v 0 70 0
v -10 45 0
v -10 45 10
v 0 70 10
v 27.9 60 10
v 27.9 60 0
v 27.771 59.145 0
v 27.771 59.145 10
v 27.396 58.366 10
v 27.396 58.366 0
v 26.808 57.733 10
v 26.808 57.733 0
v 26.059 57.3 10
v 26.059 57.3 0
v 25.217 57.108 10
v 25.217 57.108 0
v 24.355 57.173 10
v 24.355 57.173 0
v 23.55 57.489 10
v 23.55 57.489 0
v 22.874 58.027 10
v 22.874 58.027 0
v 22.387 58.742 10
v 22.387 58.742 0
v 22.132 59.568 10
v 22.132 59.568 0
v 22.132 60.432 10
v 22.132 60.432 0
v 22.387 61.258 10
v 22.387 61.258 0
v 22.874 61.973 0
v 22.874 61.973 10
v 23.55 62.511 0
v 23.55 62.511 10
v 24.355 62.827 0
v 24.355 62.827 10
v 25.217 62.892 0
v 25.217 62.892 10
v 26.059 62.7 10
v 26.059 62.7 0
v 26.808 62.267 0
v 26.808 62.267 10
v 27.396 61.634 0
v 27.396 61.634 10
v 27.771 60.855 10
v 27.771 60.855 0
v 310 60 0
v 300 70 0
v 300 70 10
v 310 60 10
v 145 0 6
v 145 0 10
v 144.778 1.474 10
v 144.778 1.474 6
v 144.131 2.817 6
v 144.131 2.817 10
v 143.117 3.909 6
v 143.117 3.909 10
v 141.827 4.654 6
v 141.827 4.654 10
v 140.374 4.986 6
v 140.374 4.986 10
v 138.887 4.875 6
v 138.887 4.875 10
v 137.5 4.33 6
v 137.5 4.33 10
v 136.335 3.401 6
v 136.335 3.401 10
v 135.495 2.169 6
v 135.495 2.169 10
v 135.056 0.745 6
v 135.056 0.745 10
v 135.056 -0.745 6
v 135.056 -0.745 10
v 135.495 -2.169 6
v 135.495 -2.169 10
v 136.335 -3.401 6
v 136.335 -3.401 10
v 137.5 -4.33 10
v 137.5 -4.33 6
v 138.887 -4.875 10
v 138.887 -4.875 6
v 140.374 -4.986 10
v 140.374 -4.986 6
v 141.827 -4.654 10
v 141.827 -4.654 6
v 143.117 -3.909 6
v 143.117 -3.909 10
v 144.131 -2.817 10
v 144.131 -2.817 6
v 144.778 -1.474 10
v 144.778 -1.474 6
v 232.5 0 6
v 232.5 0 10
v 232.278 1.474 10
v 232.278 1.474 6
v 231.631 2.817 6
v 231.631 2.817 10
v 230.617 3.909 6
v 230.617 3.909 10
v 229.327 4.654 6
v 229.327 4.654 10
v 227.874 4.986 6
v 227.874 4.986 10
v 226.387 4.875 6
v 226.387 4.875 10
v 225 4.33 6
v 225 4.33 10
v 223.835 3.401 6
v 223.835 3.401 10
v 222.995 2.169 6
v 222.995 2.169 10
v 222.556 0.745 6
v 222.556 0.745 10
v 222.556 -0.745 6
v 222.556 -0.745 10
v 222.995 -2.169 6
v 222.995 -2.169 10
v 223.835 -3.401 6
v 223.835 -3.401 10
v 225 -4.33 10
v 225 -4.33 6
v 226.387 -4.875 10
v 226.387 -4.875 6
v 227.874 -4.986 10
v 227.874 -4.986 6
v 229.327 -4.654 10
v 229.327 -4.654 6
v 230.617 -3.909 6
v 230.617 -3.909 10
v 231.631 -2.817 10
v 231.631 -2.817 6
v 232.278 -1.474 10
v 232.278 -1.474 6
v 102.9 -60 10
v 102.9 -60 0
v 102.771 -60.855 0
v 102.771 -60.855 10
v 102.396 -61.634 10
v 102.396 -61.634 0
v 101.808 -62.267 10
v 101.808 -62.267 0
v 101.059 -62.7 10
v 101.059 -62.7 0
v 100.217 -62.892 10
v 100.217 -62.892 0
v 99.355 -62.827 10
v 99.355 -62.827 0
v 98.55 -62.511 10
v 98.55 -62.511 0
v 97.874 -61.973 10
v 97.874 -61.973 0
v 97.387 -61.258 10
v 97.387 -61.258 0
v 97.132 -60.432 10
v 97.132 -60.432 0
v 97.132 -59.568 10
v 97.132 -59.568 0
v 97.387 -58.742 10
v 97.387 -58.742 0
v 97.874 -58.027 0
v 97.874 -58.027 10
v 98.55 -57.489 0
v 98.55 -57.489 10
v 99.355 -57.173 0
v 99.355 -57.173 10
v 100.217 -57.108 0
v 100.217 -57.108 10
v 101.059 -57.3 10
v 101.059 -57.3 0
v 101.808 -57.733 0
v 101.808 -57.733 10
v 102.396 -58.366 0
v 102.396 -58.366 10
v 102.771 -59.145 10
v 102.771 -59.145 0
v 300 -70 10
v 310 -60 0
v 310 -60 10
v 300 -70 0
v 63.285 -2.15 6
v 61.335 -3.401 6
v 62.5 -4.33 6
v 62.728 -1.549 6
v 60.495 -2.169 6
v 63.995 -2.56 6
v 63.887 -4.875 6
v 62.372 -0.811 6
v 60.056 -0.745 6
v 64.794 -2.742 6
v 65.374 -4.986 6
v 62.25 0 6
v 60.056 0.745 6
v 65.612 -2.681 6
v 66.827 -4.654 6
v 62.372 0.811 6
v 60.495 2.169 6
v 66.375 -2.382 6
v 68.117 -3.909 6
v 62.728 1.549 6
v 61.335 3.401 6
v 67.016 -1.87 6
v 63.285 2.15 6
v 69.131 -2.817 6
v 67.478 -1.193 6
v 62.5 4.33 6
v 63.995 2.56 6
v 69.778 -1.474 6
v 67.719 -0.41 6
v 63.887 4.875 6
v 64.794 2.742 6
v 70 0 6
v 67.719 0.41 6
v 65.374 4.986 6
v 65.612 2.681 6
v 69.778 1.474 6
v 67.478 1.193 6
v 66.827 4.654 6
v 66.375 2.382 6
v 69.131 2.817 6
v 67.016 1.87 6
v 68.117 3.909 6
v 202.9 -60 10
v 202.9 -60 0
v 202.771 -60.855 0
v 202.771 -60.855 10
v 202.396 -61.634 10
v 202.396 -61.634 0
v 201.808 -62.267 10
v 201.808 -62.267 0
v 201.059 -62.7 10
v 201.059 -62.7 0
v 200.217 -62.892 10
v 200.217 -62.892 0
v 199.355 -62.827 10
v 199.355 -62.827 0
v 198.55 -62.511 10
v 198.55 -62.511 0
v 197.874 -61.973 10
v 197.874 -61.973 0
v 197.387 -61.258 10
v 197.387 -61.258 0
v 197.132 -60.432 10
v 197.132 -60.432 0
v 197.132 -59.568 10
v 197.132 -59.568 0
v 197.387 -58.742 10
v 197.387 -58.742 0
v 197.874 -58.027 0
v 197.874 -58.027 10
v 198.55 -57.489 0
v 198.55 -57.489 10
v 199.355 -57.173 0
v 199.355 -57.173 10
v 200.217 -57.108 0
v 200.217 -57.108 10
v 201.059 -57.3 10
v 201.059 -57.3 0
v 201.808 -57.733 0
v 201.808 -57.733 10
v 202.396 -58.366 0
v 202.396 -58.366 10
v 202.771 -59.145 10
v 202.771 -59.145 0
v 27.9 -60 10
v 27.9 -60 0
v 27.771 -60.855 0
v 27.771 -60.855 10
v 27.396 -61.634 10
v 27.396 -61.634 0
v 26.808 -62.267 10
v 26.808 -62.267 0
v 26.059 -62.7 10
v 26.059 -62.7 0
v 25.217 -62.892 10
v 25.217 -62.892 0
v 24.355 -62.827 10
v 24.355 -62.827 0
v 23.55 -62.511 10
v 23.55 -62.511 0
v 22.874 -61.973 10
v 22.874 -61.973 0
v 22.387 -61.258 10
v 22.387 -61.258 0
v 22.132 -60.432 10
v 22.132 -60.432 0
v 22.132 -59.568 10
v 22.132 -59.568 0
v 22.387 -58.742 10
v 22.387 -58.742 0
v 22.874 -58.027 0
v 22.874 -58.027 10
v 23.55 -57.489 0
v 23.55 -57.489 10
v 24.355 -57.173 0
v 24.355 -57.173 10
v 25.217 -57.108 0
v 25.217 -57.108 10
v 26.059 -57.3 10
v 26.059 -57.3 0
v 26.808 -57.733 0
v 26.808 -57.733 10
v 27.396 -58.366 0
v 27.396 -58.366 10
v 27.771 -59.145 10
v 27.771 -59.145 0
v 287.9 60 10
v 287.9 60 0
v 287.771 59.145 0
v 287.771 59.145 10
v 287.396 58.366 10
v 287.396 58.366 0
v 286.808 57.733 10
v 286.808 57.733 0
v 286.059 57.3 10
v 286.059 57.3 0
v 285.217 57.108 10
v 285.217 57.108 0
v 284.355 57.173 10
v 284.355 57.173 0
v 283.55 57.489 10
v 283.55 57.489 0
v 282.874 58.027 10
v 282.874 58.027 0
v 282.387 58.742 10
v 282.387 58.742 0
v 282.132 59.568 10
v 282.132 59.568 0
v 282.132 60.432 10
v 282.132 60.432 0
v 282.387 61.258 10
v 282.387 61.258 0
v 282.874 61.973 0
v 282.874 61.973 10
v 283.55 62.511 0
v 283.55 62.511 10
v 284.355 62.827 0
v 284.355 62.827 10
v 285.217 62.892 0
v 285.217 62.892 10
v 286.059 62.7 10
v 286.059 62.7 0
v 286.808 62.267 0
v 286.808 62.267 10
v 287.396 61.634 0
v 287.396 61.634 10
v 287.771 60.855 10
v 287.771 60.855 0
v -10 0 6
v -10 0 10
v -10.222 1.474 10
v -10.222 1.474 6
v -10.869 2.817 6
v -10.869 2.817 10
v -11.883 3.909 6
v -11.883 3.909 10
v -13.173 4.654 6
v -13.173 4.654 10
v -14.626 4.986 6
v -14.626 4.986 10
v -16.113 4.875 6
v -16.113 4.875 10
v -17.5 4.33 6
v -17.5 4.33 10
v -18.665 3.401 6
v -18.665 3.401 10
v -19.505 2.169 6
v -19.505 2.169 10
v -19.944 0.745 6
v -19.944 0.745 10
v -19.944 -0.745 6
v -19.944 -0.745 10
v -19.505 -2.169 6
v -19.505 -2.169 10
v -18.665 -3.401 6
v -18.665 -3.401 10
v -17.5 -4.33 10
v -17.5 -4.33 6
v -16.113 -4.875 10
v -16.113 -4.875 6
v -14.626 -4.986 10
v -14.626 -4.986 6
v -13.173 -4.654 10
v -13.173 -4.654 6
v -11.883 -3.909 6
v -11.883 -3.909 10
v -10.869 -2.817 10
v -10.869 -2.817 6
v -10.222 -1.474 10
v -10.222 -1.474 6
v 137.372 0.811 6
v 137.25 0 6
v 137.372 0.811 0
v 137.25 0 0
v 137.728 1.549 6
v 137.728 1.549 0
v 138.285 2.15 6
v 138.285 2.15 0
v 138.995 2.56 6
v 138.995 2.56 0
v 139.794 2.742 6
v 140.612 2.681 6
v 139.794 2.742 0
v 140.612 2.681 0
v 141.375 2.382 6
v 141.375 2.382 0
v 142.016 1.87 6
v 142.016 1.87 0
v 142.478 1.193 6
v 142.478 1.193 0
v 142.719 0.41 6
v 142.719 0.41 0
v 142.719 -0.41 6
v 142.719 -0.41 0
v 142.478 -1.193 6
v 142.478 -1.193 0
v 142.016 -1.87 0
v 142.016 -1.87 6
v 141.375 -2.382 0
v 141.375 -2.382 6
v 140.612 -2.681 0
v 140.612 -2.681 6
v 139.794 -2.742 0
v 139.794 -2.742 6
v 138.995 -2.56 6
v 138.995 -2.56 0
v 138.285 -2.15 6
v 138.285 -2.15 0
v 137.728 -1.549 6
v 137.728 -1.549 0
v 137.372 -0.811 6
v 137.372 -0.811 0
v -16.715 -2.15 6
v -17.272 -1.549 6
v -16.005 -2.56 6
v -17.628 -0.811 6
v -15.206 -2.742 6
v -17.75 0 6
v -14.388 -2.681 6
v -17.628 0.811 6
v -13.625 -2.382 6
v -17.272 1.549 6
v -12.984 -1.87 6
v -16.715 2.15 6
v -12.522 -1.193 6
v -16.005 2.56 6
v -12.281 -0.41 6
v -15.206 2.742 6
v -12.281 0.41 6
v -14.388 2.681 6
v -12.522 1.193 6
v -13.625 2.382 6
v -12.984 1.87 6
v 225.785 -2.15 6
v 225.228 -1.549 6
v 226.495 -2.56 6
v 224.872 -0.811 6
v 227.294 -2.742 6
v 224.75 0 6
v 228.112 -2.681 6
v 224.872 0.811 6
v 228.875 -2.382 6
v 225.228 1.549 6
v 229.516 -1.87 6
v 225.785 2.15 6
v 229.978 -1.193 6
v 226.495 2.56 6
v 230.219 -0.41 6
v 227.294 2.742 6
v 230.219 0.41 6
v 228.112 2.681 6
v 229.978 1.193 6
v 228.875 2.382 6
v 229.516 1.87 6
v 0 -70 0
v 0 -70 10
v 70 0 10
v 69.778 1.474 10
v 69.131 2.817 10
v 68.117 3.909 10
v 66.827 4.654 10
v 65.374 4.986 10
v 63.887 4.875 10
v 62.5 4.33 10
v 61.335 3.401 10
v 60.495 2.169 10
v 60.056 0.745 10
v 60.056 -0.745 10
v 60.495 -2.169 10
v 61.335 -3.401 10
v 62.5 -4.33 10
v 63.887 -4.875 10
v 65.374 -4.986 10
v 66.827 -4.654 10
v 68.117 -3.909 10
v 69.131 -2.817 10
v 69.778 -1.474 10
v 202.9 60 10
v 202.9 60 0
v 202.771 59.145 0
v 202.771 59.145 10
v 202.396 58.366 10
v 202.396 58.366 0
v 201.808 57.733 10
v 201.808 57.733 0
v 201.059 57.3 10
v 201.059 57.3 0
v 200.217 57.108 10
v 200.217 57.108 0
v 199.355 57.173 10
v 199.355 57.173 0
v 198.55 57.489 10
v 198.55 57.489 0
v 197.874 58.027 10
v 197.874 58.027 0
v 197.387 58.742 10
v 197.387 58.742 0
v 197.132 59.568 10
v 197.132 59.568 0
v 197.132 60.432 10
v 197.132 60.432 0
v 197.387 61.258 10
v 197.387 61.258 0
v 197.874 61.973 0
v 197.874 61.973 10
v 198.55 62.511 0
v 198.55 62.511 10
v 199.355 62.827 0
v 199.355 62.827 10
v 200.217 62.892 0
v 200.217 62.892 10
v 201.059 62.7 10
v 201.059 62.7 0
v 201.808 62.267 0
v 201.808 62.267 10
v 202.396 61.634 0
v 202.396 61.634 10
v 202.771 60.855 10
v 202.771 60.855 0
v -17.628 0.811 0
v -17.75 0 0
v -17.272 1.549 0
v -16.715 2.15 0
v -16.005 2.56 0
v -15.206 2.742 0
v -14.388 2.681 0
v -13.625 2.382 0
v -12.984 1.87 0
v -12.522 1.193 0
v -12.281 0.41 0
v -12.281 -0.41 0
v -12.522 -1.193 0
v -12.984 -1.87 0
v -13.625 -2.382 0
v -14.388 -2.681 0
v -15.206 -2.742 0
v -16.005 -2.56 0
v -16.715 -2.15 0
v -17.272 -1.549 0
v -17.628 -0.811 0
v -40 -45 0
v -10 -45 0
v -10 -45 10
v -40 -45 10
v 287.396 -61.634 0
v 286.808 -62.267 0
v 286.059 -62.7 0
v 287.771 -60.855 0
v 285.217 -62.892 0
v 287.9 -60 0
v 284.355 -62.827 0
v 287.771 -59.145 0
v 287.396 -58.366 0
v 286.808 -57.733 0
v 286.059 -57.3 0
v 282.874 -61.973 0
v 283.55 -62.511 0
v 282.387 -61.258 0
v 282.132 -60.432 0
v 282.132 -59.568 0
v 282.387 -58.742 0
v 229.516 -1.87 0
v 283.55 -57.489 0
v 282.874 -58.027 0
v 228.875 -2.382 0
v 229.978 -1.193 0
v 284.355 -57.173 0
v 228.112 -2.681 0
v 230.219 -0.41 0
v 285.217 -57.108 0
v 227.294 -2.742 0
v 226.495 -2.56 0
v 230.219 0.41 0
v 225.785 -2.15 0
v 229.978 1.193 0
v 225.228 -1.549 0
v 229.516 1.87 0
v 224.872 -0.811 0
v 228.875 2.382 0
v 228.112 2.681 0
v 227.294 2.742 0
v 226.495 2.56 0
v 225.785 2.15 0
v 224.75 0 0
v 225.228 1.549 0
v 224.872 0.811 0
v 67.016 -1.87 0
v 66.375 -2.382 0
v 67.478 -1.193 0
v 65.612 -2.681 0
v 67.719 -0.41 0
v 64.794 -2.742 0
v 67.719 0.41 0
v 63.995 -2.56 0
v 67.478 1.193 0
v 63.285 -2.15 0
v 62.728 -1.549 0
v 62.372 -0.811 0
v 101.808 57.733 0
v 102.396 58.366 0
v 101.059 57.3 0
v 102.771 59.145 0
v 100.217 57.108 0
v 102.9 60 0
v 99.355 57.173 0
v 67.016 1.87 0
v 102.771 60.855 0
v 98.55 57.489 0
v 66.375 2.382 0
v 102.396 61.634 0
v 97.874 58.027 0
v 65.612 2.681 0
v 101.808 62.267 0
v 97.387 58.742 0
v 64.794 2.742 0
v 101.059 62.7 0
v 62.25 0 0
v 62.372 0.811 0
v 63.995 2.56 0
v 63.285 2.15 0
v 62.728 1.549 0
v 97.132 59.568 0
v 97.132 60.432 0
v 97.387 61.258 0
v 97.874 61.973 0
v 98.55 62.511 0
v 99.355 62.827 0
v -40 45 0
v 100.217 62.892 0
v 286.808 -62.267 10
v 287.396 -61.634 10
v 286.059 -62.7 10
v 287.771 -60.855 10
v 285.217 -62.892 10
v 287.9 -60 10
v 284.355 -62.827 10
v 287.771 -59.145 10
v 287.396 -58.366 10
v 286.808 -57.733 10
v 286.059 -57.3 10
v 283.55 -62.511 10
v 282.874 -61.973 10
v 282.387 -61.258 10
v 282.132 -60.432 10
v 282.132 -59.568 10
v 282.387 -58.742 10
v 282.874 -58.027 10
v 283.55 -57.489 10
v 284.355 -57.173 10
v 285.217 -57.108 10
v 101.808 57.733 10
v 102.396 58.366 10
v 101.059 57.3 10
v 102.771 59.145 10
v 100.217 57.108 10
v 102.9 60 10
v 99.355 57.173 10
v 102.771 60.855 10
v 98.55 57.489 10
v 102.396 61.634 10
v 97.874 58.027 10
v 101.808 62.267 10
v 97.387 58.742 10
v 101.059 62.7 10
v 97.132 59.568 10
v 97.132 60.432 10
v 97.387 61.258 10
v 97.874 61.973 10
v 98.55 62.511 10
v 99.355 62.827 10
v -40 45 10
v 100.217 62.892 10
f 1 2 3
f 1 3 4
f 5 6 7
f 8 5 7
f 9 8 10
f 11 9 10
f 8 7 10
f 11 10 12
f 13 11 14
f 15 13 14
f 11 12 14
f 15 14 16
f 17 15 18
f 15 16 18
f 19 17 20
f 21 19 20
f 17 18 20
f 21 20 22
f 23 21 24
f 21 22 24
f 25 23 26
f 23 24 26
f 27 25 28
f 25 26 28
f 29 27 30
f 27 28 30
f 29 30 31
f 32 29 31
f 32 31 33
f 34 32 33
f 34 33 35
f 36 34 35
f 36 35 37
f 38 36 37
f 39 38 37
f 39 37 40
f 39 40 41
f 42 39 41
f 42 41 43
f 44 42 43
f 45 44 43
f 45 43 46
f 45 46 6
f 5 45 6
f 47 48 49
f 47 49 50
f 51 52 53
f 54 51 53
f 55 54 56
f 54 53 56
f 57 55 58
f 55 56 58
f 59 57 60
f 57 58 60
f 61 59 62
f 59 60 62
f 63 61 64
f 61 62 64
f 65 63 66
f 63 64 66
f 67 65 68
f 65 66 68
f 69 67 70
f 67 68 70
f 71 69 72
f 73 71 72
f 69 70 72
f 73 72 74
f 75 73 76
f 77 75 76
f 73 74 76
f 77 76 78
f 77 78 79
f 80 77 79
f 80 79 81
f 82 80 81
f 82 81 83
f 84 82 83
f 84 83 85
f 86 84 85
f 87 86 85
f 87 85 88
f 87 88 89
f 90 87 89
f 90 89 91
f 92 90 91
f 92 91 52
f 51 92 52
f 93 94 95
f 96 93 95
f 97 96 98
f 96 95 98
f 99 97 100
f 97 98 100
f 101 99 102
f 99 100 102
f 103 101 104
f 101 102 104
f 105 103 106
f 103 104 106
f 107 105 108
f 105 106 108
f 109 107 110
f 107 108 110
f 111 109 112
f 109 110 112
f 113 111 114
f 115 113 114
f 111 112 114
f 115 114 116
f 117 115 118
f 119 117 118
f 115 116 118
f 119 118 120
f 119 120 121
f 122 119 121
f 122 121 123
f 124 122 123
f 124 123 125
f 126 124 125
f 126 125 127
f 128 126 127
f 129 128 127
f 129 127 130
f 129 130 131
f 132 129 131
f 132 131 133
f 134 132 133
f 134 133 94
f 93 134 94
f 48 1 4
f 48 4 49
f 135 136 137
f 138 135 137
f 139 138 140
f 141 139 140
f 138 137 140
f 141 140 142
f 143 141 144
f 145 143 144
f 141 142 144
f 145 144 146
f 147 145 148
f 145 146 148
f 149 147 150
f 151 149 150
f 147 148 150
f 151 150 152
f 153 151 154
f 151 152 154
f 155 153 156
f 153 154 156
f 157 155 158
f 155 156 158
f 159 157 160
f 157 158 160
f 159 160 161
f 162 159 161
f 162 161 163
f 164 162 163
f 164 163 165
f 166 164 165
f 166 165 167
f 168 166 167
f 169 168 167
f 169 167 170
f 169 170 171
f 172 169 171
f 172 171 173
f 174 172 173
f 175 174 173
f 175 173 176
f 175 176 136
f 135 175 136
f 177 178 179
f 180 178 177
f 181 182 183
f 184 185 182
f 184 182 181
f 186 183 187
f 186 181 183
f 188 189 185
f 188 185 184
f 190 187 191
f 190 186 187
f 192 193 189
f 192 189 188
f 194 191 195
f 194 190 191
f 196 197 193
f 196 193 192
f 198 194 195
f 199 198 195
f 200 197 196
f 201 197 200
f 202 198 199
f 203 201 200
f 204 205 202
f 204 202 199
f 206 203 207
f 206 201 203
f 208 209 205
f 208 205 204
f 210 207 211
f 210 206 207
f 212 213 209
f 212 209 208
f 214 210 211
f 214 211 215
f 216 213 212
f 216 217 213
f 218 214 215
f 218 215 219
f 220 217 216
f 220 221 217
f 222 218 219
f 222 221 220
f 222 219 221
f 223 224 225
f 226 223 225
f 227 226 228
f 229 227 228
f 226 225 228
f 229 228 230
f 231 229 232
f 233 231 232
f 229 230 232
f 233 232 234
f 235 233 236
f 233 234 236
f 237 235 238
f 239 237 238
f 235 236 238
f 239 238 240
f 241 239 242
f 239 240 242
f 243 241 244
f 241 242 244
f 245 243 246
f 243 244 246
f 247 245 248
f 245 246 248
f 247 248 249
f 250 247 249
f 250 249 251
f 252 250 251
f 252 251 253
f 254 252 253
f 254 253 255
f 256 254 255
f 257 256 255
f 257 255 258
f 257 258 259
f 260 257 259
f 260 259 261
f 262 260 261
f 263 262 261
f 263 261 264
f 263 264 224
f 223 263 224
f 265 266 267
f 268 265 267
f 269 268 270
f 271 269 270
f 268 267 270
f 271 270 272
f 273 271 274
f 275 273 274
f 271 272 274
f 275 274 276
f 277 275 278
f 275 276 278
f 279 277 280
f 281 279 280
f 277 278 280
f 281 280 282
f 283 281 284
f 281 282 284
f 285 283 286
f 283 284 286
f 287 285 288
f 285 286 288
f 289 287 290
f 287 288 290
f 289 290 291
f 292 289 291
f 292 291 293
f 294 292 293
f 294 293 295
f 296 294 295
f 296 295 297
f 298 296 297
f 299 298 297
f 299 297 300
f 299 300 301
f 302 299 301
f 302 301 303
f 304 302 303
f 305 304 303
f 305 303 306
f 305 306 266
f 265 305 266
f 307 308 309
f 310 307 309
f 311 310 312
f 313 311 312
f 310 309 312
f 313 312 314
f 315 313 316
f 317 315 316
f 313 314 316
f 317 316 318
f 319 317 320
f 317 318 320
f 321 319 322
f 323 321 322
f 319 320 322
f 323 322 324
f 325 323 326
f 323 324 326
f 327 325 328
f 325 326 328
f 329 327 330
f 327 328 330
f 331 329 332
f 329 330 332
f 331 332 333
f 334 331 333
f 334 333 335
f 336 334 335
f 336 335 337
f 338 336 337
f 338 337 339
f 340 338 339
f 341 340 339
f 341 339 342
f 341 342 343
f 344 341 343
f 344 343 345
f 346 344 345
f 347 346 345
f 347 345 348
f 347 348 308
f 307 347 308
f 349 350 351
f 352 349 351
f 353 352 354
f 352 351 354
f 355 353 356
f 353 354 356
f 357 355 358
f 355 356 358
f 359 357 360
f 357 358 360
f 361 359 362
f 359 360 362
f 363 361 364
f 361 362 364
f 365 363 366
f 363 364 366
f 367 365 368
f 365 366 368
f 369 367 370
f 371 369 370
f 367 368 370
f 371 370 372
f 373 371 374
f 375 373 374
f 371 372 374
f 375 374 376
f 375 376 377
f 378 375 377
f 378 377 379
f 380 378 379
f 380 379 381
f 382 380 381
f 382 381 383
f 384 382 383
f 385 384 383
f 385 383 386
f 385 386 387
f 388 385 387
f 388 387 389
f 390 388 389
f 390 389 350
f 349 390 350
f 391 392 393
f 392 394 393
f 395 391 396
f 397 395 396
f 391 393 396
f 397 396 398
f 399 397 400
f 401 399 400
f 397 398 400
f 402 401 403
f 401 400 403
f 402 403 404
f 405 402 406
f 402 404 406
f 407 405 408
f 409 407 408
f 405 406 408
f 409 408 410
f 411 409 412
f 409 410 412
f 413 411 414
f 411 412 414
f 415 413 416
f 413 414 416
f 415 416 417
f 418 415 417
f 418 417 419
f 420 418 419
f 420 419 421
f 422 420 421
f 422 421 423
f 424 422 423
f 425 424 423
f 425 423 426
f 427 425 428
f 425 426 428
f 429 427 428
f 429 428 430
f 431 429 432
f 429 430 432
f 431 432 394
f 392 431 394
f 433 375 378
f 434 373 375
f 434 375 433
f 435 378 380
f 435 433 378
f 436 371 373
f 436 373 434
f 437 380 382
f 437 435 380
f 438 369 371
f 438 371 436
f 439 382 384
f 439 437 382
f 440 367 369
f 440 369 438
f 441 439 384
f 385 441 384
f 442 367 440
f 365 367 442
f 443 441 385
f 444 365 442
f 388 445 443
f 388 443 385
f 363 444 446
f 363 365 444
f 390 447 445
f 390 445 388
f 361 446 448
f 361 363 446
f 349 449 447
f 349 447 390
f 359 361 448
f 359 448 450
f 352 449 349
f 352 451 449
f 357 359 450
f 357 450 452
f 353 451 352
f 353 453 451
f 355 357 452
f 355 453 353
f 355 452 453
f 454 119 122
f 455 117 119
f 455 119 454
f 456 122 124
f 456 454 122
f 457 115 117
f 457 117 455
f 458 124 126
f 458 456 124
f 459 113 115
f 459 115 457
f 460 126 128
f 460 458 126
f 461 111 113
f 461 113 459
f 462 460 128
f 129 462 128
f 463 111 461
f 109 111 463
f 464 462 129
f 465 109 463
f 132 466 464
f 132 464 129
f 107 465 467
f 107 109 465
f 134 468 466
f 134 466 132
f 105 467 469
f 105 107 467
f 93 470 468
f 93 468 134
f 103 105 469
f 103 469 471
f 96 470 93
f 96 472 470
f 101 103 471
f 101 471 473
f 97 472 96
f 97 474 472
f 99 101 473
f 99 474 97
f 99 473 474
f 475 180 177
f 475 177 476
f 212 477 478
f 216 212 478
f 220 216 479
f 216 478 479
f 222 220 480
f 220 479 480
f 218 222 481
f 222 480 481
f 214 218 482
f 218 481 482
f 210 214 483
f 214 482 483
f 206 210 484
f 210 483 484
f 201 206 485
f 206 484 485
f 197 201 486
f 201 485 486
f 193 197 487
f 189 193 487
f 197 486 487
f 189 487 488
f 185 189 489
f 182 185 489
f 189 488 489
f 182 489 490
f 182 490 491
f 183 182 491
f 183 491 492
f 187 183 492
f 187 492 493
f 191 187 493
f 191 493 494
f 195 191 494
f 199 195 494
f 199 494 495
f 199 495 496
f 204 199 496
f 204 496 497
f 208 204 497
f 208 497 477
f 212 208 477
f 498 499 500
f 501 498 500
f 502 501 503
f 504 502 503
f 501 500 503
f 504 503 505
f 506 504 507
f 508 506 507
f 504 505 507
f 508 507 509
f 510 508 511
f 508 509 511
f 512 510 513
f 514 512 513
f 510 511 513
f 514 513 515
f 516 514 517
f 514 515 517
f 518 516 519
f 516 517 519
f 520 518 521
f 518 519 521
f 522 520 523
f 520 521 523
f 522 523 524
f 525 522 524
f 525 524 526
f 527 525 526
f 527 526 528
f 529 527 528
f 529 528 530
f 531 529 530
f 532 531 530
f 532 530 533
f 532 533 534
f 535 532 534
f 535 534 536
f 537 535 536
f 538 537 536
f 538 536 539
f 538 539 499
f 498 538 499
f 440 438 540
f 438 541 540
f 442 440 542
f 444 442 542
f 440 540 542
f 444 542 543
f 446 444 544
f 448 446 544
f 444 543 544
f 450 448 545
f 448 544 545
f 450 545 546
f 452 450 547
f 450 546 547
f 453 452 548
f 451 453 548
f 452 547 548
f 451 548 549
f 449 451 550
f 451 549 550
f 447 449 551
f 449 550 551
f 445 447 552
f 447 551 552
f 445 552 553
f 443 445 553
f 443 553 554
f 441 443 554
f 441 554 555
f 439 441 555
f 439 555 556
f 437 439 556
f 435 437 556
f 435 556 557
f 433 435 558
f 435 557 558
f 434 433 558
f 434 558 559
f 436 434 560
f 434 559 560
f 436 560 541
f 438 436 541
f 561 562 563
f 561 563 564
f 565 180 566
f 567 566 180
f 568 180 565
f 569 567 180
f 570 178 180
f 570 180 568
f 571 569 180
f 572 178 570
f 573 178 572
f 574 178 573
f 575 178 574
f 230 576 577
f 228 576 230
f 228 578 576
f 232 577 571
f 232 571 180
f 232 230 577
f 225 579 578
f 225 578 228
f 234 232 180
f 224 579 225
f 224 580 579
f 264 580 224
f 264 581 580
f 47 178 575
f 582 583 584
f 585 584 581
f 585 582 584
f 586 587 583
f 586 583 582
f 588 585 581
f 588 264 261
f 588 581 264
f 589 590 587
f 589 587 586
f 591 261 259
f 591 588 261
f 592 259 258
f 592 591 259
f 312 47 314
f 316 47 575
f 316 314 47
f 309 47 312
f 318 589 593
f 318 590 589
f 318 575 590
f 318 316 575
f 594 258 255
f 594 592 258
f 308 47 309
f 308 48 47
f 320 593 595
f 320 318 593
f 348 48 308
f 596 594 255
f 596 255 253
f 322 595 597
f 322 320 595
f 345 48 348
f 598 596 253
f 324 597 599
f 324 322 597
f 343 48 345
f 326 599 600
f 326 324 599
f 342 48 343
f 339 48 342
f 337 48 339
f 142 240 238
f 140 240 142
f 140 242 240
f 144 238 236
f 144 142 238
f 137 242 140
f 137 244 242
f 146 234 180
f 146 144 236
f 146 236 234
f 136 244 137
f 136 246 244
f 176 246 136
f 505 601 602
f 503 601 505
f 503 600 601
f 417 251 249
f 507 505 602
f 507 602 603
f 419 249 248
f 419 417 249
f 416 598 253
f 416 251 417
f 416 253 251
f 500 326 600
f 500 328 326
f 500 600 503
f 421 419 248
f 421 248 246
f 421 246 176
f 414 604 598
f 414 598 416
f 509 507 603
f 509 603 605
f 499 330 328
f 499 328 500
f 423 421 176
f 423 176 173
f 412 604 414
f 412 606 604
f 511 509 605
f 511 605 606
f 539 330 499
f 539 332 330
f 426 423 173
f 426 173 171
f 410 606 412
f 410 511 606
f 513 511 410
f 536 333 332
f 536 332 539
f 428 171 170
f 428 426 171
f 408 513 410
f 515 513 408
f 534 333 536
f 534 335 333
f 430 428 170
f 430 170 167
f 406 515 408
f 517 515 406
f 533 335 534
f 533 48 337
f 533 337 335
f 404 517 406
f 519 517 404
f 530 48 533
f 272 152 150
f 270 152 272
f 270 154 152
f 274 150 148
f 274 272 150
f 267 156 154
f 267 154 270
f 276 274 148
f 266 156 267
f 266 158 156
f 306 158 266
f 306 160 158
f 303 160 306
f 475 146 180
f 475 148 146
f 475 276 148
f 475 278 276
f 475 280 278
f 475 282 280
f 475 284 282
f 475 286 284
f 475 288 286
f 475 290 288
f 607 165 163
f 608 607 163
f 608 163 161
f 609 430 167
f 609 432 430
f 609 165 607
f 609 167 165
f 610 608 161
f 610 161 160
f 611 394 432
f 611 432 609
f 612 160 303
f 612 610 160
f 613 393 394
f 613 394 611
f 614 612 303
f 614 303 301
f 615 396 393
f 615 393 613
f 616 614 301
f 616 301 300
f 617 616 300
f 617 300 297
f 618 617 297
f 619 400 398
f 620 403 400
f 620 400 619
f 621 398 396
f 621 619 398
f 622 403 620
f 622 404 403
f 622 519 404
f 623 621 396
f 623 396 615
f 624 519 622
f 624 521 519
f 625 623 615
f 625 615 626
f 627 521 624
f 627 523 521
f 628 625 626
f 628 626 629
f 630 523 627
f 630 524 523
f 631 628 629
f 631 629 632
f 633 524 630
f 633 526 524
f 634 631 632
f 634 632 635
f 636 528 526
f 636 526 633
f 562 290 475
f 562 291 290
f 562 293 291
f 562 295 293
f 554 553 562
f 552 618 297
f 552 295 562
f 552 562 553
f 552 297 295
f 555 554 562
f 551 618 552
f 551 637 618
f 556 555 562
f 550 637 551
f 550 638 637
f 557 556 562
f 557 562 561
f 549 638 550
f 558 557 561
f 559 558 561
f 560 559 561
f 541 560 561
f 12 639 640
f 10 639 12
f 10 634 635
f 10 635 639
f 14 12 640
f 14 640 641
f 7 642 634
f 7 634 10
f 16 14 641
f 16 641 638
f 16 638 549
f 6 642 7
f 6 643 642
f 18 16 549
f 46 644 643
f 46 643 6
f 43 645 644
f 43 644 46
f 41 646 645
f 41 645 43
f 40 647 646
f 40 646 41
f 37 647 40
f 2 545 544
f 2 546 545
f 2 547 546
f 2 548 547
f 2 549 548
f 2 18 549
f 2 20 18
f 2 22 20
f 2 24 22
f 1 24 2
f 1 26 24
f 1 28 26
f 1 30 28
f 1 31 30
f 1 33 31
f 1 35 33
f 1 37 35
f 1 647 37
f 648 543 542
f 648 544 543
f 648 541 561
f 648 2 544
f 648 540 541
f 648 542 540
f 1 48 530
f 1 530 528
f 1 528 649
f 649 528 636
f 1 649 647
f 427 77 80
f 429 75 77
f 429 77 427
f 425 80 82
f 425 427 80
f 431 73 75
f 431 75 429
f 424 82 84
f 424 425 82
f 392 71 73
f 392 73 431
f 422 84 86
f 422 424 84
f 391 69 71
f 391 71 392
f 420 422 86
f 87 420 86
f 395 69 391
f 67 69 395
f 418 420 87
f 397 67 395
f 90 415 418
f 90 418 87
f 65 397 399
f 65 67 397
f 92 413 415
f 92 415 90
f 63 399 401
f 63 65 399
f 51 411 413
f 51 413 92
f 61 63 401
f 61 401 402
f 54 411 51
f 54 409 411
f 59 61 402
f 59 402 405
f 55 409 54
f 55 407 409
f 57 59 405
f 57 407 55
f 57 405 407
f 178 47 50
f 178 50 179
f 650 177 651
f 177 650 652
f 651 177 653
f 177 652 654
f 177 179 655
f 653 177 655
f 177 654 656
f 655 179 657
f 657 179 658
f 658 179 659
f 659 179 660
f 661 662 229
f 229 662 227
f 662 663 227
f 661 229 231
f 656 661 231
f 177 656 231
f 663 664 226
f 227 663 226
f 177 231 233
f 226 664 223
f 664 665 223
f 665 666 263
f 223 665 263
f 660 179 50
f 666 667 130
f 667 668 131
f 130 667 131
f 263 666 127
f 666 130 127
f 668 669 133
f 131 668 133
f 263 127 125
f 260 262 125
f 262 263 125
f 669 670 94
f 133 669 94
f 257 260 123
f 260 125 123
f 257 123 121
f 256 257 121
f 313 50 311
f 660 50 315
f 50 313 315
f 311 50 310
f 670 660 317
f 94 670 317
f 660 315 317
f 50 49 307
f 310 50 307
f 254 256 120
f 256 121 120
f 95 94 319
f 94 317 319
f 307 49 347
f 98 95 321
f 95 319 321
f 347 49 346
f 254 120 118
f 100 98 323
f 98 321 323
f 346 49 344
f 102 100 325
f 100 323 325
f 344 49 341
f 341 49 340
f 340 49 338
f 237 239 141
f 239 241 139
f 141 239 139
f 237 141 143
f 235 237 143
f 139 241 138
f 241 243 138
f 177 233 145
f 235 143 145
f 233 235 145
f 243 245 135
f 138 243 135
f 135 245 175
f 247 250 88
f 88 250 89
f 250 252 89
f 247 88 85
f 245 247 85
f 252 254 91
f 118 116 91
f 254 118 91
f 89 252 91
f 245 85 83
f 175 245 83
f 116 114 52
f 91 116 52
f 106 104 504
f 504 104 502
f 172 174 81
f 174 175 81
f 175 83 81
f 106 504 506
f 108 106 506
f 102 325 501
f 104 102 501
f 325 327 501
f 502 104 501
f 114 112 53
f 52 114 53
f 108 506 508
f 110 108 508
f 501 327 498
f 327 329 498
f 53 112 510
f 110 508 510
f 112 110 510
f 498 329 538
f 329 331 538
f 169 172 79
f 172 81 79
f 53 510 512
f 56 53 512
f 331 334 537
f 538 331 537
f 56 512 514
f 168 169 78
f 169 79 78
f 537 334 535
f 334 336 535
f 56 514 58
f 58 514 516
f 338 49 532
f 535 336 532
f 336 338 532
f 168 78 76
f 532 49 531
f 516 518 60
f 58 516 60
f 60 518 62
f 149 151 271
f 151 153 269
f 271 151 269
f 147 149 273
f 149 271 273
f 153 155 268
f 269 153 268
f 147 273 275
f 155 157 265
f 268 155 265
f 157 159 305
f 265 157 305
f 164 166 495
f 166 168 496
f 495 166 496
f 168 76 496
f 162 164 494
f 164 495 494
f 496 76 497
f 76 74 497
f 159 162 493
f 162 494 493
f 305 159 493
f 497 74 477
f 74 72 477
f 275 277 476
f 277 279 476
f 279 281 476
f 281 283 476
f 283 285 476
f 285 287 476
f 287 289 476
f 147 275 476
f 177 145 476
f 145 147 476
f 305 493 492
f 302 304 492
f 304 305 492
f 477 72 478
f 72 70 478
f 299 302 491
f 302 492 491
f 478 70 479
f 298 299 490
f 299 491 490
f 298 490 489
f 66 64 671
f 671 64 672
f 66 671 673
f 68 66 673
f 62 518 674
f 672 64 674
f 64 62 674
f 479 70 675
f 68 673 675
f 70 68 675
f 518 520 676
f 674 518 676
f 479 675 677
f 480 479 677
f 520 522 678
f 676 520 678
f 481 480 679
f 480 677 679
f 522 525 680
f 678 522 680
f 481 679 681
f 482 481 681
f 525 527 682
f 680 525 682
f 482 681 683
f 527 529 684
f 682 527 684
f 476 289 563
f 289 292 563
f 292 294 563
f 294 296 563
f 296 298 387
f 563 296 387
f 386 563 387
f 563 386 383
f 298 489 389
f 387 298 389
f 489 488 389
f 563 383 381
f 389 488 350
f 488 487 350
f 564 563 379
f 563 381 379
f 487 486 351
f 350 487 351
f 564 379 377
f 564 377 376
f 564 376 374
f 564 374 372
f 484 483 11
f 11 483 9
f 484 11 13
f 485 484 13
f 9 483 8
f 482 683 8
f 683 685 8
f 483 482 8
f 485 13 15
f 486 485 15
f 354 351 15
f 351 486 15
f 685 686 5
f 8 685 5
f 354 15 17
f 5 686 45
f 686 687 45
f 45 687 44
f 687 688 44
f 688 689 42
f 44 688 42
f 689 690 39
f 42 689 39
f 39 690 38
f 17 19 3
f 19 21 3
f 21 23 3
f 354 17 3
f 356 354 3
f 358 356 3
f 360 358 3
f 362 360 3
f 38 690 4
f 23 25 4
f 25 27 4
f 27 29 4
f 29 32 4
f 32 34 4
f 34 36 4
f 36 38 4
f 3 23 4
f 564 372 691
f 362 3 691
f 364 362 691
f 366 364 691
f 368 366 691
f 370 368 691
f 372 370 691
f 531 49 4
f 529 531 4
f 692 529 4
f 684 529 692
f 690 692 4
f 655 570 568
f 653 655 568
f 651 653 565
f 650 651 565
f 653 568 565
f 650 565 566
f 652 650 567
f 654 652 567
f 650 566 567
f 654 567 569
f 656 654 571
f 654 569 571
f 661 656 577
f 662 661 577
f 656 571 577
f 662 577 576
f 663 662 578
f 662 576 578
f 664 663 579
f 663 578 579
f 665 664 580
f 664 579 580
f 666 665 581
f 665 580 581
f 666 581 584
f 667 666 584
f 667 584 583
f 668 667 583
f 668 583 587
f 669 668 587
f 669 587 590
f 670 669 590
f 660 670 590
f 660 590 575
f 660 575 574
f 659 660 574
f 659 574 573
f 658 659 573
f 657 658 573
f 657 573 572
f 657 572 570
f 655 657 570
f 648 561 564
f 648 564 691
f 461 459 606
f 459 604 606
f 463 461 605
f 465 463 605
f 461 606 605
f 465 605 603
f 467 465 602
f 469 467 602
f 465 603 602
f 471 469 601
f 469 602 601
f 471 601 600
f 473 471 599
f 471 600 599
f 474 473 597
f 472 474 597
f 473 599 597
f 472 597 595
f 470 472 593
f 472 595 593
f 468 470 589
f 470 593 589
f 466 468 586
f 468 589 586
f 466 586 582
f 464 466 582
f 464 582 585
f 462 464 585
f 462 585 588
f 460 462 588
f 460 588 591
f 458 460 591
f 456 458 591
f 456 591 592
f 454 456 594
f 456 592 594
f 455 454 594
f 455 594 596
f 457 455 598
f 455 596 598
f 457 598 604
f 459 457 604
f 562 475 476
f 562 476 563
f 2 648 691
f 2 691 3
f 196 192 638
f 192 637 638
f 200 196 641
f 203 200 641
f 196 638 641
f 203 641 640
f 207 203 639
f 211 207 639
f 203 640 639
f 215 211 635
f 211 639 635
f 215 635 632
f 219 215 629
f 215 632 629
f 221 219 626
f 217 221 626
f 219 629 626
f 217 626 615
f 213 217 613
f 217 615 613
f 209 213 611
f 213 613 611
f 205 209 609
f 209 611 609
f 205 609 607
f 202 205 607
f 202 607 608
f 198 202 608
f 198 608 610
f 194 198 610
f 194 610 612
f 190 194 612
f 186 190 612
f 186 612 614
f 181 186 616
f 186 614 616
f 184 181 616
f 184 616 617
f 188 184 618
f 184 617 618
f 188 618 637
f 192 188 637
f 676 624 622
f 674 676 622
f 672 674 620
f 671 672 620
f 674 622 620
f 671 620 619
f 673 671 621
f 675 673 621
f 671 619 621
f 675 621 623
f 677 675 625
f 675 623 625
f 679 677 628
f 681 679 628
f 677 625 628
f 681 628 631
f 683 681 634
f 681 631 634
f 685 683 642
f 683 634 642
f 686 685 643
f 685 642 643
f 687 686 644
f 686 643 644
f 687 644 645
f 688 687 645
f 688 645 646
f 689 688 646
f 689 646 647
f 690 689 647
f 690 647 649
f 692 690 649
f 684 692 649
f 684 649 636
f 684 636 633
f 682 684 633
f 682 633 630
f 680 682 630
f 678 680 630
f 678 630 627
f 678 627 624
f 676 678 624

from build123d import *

# Parameters (mm, degrees)
PAD_DEPTH           = 10
HOLE004_D           = 5.5
HOLE004_DEPTH       = 25
HOLE004_CBORE_D     = 10
HOLE004_CBORE_DEPTH = 4
SKETCH010_R         = 2.9
HOLE005_DEPTH       = 25


with BuildPart() as part:
    # Sketch → Pad (new body)
    with BuildSketch(Plane.XY):
        Polygon((0, 70), (300, 70), (310, 60), (310, -60), (300, -70), (0, -70), (-10, -45), (-40, -45), (-40, 45), (-10, 45), align=None)
    extrude(amount=PAD_DEPTH)

    # Hole004
    with Locations(Plane.XY.offset(10)):
        with Locations((-15, 0), (65, 0), (140, 0), (227.5, 0)):
            CounterBoreHole(HOLE004_D / 2, HOLE004_CBORE_D / 2, HOLE004_CBORE_DEPTH, depth=HOLE004_DEPTH)

    # Sketch010 (on Face4 of Hole004) → Hole005 (cut)
    with BuildSketch(Plane(origin=(0, 0, 0), x_dir=(1, 0, 0), z_dir=(0, 0, -1))):
        with Locations((25, 60)):
            Circle(SKETCH010_R)
        with Locations((100, 60)):
            Circle(SKETCH010_R)
        with Locations((200, 60)):
            Circle(SKETCH010_R)
        with Locations((285, 60)):
            Circle(SKETCH010_R)
        with Locations((25, -60)):
            Circle(SKETCH010_R)
        with Locations((100, -60)):
            Circle(SKETCH010_R)
        with Locations((200, -60)):
            Circle(SKETCH010_R)
        with Locations((285, -60)):
            Circle(SKETCH010_R)
    extrude(amount=-HOLE005_DEPTH, mode=Mode.SUBTRACT)


solid = part.part
